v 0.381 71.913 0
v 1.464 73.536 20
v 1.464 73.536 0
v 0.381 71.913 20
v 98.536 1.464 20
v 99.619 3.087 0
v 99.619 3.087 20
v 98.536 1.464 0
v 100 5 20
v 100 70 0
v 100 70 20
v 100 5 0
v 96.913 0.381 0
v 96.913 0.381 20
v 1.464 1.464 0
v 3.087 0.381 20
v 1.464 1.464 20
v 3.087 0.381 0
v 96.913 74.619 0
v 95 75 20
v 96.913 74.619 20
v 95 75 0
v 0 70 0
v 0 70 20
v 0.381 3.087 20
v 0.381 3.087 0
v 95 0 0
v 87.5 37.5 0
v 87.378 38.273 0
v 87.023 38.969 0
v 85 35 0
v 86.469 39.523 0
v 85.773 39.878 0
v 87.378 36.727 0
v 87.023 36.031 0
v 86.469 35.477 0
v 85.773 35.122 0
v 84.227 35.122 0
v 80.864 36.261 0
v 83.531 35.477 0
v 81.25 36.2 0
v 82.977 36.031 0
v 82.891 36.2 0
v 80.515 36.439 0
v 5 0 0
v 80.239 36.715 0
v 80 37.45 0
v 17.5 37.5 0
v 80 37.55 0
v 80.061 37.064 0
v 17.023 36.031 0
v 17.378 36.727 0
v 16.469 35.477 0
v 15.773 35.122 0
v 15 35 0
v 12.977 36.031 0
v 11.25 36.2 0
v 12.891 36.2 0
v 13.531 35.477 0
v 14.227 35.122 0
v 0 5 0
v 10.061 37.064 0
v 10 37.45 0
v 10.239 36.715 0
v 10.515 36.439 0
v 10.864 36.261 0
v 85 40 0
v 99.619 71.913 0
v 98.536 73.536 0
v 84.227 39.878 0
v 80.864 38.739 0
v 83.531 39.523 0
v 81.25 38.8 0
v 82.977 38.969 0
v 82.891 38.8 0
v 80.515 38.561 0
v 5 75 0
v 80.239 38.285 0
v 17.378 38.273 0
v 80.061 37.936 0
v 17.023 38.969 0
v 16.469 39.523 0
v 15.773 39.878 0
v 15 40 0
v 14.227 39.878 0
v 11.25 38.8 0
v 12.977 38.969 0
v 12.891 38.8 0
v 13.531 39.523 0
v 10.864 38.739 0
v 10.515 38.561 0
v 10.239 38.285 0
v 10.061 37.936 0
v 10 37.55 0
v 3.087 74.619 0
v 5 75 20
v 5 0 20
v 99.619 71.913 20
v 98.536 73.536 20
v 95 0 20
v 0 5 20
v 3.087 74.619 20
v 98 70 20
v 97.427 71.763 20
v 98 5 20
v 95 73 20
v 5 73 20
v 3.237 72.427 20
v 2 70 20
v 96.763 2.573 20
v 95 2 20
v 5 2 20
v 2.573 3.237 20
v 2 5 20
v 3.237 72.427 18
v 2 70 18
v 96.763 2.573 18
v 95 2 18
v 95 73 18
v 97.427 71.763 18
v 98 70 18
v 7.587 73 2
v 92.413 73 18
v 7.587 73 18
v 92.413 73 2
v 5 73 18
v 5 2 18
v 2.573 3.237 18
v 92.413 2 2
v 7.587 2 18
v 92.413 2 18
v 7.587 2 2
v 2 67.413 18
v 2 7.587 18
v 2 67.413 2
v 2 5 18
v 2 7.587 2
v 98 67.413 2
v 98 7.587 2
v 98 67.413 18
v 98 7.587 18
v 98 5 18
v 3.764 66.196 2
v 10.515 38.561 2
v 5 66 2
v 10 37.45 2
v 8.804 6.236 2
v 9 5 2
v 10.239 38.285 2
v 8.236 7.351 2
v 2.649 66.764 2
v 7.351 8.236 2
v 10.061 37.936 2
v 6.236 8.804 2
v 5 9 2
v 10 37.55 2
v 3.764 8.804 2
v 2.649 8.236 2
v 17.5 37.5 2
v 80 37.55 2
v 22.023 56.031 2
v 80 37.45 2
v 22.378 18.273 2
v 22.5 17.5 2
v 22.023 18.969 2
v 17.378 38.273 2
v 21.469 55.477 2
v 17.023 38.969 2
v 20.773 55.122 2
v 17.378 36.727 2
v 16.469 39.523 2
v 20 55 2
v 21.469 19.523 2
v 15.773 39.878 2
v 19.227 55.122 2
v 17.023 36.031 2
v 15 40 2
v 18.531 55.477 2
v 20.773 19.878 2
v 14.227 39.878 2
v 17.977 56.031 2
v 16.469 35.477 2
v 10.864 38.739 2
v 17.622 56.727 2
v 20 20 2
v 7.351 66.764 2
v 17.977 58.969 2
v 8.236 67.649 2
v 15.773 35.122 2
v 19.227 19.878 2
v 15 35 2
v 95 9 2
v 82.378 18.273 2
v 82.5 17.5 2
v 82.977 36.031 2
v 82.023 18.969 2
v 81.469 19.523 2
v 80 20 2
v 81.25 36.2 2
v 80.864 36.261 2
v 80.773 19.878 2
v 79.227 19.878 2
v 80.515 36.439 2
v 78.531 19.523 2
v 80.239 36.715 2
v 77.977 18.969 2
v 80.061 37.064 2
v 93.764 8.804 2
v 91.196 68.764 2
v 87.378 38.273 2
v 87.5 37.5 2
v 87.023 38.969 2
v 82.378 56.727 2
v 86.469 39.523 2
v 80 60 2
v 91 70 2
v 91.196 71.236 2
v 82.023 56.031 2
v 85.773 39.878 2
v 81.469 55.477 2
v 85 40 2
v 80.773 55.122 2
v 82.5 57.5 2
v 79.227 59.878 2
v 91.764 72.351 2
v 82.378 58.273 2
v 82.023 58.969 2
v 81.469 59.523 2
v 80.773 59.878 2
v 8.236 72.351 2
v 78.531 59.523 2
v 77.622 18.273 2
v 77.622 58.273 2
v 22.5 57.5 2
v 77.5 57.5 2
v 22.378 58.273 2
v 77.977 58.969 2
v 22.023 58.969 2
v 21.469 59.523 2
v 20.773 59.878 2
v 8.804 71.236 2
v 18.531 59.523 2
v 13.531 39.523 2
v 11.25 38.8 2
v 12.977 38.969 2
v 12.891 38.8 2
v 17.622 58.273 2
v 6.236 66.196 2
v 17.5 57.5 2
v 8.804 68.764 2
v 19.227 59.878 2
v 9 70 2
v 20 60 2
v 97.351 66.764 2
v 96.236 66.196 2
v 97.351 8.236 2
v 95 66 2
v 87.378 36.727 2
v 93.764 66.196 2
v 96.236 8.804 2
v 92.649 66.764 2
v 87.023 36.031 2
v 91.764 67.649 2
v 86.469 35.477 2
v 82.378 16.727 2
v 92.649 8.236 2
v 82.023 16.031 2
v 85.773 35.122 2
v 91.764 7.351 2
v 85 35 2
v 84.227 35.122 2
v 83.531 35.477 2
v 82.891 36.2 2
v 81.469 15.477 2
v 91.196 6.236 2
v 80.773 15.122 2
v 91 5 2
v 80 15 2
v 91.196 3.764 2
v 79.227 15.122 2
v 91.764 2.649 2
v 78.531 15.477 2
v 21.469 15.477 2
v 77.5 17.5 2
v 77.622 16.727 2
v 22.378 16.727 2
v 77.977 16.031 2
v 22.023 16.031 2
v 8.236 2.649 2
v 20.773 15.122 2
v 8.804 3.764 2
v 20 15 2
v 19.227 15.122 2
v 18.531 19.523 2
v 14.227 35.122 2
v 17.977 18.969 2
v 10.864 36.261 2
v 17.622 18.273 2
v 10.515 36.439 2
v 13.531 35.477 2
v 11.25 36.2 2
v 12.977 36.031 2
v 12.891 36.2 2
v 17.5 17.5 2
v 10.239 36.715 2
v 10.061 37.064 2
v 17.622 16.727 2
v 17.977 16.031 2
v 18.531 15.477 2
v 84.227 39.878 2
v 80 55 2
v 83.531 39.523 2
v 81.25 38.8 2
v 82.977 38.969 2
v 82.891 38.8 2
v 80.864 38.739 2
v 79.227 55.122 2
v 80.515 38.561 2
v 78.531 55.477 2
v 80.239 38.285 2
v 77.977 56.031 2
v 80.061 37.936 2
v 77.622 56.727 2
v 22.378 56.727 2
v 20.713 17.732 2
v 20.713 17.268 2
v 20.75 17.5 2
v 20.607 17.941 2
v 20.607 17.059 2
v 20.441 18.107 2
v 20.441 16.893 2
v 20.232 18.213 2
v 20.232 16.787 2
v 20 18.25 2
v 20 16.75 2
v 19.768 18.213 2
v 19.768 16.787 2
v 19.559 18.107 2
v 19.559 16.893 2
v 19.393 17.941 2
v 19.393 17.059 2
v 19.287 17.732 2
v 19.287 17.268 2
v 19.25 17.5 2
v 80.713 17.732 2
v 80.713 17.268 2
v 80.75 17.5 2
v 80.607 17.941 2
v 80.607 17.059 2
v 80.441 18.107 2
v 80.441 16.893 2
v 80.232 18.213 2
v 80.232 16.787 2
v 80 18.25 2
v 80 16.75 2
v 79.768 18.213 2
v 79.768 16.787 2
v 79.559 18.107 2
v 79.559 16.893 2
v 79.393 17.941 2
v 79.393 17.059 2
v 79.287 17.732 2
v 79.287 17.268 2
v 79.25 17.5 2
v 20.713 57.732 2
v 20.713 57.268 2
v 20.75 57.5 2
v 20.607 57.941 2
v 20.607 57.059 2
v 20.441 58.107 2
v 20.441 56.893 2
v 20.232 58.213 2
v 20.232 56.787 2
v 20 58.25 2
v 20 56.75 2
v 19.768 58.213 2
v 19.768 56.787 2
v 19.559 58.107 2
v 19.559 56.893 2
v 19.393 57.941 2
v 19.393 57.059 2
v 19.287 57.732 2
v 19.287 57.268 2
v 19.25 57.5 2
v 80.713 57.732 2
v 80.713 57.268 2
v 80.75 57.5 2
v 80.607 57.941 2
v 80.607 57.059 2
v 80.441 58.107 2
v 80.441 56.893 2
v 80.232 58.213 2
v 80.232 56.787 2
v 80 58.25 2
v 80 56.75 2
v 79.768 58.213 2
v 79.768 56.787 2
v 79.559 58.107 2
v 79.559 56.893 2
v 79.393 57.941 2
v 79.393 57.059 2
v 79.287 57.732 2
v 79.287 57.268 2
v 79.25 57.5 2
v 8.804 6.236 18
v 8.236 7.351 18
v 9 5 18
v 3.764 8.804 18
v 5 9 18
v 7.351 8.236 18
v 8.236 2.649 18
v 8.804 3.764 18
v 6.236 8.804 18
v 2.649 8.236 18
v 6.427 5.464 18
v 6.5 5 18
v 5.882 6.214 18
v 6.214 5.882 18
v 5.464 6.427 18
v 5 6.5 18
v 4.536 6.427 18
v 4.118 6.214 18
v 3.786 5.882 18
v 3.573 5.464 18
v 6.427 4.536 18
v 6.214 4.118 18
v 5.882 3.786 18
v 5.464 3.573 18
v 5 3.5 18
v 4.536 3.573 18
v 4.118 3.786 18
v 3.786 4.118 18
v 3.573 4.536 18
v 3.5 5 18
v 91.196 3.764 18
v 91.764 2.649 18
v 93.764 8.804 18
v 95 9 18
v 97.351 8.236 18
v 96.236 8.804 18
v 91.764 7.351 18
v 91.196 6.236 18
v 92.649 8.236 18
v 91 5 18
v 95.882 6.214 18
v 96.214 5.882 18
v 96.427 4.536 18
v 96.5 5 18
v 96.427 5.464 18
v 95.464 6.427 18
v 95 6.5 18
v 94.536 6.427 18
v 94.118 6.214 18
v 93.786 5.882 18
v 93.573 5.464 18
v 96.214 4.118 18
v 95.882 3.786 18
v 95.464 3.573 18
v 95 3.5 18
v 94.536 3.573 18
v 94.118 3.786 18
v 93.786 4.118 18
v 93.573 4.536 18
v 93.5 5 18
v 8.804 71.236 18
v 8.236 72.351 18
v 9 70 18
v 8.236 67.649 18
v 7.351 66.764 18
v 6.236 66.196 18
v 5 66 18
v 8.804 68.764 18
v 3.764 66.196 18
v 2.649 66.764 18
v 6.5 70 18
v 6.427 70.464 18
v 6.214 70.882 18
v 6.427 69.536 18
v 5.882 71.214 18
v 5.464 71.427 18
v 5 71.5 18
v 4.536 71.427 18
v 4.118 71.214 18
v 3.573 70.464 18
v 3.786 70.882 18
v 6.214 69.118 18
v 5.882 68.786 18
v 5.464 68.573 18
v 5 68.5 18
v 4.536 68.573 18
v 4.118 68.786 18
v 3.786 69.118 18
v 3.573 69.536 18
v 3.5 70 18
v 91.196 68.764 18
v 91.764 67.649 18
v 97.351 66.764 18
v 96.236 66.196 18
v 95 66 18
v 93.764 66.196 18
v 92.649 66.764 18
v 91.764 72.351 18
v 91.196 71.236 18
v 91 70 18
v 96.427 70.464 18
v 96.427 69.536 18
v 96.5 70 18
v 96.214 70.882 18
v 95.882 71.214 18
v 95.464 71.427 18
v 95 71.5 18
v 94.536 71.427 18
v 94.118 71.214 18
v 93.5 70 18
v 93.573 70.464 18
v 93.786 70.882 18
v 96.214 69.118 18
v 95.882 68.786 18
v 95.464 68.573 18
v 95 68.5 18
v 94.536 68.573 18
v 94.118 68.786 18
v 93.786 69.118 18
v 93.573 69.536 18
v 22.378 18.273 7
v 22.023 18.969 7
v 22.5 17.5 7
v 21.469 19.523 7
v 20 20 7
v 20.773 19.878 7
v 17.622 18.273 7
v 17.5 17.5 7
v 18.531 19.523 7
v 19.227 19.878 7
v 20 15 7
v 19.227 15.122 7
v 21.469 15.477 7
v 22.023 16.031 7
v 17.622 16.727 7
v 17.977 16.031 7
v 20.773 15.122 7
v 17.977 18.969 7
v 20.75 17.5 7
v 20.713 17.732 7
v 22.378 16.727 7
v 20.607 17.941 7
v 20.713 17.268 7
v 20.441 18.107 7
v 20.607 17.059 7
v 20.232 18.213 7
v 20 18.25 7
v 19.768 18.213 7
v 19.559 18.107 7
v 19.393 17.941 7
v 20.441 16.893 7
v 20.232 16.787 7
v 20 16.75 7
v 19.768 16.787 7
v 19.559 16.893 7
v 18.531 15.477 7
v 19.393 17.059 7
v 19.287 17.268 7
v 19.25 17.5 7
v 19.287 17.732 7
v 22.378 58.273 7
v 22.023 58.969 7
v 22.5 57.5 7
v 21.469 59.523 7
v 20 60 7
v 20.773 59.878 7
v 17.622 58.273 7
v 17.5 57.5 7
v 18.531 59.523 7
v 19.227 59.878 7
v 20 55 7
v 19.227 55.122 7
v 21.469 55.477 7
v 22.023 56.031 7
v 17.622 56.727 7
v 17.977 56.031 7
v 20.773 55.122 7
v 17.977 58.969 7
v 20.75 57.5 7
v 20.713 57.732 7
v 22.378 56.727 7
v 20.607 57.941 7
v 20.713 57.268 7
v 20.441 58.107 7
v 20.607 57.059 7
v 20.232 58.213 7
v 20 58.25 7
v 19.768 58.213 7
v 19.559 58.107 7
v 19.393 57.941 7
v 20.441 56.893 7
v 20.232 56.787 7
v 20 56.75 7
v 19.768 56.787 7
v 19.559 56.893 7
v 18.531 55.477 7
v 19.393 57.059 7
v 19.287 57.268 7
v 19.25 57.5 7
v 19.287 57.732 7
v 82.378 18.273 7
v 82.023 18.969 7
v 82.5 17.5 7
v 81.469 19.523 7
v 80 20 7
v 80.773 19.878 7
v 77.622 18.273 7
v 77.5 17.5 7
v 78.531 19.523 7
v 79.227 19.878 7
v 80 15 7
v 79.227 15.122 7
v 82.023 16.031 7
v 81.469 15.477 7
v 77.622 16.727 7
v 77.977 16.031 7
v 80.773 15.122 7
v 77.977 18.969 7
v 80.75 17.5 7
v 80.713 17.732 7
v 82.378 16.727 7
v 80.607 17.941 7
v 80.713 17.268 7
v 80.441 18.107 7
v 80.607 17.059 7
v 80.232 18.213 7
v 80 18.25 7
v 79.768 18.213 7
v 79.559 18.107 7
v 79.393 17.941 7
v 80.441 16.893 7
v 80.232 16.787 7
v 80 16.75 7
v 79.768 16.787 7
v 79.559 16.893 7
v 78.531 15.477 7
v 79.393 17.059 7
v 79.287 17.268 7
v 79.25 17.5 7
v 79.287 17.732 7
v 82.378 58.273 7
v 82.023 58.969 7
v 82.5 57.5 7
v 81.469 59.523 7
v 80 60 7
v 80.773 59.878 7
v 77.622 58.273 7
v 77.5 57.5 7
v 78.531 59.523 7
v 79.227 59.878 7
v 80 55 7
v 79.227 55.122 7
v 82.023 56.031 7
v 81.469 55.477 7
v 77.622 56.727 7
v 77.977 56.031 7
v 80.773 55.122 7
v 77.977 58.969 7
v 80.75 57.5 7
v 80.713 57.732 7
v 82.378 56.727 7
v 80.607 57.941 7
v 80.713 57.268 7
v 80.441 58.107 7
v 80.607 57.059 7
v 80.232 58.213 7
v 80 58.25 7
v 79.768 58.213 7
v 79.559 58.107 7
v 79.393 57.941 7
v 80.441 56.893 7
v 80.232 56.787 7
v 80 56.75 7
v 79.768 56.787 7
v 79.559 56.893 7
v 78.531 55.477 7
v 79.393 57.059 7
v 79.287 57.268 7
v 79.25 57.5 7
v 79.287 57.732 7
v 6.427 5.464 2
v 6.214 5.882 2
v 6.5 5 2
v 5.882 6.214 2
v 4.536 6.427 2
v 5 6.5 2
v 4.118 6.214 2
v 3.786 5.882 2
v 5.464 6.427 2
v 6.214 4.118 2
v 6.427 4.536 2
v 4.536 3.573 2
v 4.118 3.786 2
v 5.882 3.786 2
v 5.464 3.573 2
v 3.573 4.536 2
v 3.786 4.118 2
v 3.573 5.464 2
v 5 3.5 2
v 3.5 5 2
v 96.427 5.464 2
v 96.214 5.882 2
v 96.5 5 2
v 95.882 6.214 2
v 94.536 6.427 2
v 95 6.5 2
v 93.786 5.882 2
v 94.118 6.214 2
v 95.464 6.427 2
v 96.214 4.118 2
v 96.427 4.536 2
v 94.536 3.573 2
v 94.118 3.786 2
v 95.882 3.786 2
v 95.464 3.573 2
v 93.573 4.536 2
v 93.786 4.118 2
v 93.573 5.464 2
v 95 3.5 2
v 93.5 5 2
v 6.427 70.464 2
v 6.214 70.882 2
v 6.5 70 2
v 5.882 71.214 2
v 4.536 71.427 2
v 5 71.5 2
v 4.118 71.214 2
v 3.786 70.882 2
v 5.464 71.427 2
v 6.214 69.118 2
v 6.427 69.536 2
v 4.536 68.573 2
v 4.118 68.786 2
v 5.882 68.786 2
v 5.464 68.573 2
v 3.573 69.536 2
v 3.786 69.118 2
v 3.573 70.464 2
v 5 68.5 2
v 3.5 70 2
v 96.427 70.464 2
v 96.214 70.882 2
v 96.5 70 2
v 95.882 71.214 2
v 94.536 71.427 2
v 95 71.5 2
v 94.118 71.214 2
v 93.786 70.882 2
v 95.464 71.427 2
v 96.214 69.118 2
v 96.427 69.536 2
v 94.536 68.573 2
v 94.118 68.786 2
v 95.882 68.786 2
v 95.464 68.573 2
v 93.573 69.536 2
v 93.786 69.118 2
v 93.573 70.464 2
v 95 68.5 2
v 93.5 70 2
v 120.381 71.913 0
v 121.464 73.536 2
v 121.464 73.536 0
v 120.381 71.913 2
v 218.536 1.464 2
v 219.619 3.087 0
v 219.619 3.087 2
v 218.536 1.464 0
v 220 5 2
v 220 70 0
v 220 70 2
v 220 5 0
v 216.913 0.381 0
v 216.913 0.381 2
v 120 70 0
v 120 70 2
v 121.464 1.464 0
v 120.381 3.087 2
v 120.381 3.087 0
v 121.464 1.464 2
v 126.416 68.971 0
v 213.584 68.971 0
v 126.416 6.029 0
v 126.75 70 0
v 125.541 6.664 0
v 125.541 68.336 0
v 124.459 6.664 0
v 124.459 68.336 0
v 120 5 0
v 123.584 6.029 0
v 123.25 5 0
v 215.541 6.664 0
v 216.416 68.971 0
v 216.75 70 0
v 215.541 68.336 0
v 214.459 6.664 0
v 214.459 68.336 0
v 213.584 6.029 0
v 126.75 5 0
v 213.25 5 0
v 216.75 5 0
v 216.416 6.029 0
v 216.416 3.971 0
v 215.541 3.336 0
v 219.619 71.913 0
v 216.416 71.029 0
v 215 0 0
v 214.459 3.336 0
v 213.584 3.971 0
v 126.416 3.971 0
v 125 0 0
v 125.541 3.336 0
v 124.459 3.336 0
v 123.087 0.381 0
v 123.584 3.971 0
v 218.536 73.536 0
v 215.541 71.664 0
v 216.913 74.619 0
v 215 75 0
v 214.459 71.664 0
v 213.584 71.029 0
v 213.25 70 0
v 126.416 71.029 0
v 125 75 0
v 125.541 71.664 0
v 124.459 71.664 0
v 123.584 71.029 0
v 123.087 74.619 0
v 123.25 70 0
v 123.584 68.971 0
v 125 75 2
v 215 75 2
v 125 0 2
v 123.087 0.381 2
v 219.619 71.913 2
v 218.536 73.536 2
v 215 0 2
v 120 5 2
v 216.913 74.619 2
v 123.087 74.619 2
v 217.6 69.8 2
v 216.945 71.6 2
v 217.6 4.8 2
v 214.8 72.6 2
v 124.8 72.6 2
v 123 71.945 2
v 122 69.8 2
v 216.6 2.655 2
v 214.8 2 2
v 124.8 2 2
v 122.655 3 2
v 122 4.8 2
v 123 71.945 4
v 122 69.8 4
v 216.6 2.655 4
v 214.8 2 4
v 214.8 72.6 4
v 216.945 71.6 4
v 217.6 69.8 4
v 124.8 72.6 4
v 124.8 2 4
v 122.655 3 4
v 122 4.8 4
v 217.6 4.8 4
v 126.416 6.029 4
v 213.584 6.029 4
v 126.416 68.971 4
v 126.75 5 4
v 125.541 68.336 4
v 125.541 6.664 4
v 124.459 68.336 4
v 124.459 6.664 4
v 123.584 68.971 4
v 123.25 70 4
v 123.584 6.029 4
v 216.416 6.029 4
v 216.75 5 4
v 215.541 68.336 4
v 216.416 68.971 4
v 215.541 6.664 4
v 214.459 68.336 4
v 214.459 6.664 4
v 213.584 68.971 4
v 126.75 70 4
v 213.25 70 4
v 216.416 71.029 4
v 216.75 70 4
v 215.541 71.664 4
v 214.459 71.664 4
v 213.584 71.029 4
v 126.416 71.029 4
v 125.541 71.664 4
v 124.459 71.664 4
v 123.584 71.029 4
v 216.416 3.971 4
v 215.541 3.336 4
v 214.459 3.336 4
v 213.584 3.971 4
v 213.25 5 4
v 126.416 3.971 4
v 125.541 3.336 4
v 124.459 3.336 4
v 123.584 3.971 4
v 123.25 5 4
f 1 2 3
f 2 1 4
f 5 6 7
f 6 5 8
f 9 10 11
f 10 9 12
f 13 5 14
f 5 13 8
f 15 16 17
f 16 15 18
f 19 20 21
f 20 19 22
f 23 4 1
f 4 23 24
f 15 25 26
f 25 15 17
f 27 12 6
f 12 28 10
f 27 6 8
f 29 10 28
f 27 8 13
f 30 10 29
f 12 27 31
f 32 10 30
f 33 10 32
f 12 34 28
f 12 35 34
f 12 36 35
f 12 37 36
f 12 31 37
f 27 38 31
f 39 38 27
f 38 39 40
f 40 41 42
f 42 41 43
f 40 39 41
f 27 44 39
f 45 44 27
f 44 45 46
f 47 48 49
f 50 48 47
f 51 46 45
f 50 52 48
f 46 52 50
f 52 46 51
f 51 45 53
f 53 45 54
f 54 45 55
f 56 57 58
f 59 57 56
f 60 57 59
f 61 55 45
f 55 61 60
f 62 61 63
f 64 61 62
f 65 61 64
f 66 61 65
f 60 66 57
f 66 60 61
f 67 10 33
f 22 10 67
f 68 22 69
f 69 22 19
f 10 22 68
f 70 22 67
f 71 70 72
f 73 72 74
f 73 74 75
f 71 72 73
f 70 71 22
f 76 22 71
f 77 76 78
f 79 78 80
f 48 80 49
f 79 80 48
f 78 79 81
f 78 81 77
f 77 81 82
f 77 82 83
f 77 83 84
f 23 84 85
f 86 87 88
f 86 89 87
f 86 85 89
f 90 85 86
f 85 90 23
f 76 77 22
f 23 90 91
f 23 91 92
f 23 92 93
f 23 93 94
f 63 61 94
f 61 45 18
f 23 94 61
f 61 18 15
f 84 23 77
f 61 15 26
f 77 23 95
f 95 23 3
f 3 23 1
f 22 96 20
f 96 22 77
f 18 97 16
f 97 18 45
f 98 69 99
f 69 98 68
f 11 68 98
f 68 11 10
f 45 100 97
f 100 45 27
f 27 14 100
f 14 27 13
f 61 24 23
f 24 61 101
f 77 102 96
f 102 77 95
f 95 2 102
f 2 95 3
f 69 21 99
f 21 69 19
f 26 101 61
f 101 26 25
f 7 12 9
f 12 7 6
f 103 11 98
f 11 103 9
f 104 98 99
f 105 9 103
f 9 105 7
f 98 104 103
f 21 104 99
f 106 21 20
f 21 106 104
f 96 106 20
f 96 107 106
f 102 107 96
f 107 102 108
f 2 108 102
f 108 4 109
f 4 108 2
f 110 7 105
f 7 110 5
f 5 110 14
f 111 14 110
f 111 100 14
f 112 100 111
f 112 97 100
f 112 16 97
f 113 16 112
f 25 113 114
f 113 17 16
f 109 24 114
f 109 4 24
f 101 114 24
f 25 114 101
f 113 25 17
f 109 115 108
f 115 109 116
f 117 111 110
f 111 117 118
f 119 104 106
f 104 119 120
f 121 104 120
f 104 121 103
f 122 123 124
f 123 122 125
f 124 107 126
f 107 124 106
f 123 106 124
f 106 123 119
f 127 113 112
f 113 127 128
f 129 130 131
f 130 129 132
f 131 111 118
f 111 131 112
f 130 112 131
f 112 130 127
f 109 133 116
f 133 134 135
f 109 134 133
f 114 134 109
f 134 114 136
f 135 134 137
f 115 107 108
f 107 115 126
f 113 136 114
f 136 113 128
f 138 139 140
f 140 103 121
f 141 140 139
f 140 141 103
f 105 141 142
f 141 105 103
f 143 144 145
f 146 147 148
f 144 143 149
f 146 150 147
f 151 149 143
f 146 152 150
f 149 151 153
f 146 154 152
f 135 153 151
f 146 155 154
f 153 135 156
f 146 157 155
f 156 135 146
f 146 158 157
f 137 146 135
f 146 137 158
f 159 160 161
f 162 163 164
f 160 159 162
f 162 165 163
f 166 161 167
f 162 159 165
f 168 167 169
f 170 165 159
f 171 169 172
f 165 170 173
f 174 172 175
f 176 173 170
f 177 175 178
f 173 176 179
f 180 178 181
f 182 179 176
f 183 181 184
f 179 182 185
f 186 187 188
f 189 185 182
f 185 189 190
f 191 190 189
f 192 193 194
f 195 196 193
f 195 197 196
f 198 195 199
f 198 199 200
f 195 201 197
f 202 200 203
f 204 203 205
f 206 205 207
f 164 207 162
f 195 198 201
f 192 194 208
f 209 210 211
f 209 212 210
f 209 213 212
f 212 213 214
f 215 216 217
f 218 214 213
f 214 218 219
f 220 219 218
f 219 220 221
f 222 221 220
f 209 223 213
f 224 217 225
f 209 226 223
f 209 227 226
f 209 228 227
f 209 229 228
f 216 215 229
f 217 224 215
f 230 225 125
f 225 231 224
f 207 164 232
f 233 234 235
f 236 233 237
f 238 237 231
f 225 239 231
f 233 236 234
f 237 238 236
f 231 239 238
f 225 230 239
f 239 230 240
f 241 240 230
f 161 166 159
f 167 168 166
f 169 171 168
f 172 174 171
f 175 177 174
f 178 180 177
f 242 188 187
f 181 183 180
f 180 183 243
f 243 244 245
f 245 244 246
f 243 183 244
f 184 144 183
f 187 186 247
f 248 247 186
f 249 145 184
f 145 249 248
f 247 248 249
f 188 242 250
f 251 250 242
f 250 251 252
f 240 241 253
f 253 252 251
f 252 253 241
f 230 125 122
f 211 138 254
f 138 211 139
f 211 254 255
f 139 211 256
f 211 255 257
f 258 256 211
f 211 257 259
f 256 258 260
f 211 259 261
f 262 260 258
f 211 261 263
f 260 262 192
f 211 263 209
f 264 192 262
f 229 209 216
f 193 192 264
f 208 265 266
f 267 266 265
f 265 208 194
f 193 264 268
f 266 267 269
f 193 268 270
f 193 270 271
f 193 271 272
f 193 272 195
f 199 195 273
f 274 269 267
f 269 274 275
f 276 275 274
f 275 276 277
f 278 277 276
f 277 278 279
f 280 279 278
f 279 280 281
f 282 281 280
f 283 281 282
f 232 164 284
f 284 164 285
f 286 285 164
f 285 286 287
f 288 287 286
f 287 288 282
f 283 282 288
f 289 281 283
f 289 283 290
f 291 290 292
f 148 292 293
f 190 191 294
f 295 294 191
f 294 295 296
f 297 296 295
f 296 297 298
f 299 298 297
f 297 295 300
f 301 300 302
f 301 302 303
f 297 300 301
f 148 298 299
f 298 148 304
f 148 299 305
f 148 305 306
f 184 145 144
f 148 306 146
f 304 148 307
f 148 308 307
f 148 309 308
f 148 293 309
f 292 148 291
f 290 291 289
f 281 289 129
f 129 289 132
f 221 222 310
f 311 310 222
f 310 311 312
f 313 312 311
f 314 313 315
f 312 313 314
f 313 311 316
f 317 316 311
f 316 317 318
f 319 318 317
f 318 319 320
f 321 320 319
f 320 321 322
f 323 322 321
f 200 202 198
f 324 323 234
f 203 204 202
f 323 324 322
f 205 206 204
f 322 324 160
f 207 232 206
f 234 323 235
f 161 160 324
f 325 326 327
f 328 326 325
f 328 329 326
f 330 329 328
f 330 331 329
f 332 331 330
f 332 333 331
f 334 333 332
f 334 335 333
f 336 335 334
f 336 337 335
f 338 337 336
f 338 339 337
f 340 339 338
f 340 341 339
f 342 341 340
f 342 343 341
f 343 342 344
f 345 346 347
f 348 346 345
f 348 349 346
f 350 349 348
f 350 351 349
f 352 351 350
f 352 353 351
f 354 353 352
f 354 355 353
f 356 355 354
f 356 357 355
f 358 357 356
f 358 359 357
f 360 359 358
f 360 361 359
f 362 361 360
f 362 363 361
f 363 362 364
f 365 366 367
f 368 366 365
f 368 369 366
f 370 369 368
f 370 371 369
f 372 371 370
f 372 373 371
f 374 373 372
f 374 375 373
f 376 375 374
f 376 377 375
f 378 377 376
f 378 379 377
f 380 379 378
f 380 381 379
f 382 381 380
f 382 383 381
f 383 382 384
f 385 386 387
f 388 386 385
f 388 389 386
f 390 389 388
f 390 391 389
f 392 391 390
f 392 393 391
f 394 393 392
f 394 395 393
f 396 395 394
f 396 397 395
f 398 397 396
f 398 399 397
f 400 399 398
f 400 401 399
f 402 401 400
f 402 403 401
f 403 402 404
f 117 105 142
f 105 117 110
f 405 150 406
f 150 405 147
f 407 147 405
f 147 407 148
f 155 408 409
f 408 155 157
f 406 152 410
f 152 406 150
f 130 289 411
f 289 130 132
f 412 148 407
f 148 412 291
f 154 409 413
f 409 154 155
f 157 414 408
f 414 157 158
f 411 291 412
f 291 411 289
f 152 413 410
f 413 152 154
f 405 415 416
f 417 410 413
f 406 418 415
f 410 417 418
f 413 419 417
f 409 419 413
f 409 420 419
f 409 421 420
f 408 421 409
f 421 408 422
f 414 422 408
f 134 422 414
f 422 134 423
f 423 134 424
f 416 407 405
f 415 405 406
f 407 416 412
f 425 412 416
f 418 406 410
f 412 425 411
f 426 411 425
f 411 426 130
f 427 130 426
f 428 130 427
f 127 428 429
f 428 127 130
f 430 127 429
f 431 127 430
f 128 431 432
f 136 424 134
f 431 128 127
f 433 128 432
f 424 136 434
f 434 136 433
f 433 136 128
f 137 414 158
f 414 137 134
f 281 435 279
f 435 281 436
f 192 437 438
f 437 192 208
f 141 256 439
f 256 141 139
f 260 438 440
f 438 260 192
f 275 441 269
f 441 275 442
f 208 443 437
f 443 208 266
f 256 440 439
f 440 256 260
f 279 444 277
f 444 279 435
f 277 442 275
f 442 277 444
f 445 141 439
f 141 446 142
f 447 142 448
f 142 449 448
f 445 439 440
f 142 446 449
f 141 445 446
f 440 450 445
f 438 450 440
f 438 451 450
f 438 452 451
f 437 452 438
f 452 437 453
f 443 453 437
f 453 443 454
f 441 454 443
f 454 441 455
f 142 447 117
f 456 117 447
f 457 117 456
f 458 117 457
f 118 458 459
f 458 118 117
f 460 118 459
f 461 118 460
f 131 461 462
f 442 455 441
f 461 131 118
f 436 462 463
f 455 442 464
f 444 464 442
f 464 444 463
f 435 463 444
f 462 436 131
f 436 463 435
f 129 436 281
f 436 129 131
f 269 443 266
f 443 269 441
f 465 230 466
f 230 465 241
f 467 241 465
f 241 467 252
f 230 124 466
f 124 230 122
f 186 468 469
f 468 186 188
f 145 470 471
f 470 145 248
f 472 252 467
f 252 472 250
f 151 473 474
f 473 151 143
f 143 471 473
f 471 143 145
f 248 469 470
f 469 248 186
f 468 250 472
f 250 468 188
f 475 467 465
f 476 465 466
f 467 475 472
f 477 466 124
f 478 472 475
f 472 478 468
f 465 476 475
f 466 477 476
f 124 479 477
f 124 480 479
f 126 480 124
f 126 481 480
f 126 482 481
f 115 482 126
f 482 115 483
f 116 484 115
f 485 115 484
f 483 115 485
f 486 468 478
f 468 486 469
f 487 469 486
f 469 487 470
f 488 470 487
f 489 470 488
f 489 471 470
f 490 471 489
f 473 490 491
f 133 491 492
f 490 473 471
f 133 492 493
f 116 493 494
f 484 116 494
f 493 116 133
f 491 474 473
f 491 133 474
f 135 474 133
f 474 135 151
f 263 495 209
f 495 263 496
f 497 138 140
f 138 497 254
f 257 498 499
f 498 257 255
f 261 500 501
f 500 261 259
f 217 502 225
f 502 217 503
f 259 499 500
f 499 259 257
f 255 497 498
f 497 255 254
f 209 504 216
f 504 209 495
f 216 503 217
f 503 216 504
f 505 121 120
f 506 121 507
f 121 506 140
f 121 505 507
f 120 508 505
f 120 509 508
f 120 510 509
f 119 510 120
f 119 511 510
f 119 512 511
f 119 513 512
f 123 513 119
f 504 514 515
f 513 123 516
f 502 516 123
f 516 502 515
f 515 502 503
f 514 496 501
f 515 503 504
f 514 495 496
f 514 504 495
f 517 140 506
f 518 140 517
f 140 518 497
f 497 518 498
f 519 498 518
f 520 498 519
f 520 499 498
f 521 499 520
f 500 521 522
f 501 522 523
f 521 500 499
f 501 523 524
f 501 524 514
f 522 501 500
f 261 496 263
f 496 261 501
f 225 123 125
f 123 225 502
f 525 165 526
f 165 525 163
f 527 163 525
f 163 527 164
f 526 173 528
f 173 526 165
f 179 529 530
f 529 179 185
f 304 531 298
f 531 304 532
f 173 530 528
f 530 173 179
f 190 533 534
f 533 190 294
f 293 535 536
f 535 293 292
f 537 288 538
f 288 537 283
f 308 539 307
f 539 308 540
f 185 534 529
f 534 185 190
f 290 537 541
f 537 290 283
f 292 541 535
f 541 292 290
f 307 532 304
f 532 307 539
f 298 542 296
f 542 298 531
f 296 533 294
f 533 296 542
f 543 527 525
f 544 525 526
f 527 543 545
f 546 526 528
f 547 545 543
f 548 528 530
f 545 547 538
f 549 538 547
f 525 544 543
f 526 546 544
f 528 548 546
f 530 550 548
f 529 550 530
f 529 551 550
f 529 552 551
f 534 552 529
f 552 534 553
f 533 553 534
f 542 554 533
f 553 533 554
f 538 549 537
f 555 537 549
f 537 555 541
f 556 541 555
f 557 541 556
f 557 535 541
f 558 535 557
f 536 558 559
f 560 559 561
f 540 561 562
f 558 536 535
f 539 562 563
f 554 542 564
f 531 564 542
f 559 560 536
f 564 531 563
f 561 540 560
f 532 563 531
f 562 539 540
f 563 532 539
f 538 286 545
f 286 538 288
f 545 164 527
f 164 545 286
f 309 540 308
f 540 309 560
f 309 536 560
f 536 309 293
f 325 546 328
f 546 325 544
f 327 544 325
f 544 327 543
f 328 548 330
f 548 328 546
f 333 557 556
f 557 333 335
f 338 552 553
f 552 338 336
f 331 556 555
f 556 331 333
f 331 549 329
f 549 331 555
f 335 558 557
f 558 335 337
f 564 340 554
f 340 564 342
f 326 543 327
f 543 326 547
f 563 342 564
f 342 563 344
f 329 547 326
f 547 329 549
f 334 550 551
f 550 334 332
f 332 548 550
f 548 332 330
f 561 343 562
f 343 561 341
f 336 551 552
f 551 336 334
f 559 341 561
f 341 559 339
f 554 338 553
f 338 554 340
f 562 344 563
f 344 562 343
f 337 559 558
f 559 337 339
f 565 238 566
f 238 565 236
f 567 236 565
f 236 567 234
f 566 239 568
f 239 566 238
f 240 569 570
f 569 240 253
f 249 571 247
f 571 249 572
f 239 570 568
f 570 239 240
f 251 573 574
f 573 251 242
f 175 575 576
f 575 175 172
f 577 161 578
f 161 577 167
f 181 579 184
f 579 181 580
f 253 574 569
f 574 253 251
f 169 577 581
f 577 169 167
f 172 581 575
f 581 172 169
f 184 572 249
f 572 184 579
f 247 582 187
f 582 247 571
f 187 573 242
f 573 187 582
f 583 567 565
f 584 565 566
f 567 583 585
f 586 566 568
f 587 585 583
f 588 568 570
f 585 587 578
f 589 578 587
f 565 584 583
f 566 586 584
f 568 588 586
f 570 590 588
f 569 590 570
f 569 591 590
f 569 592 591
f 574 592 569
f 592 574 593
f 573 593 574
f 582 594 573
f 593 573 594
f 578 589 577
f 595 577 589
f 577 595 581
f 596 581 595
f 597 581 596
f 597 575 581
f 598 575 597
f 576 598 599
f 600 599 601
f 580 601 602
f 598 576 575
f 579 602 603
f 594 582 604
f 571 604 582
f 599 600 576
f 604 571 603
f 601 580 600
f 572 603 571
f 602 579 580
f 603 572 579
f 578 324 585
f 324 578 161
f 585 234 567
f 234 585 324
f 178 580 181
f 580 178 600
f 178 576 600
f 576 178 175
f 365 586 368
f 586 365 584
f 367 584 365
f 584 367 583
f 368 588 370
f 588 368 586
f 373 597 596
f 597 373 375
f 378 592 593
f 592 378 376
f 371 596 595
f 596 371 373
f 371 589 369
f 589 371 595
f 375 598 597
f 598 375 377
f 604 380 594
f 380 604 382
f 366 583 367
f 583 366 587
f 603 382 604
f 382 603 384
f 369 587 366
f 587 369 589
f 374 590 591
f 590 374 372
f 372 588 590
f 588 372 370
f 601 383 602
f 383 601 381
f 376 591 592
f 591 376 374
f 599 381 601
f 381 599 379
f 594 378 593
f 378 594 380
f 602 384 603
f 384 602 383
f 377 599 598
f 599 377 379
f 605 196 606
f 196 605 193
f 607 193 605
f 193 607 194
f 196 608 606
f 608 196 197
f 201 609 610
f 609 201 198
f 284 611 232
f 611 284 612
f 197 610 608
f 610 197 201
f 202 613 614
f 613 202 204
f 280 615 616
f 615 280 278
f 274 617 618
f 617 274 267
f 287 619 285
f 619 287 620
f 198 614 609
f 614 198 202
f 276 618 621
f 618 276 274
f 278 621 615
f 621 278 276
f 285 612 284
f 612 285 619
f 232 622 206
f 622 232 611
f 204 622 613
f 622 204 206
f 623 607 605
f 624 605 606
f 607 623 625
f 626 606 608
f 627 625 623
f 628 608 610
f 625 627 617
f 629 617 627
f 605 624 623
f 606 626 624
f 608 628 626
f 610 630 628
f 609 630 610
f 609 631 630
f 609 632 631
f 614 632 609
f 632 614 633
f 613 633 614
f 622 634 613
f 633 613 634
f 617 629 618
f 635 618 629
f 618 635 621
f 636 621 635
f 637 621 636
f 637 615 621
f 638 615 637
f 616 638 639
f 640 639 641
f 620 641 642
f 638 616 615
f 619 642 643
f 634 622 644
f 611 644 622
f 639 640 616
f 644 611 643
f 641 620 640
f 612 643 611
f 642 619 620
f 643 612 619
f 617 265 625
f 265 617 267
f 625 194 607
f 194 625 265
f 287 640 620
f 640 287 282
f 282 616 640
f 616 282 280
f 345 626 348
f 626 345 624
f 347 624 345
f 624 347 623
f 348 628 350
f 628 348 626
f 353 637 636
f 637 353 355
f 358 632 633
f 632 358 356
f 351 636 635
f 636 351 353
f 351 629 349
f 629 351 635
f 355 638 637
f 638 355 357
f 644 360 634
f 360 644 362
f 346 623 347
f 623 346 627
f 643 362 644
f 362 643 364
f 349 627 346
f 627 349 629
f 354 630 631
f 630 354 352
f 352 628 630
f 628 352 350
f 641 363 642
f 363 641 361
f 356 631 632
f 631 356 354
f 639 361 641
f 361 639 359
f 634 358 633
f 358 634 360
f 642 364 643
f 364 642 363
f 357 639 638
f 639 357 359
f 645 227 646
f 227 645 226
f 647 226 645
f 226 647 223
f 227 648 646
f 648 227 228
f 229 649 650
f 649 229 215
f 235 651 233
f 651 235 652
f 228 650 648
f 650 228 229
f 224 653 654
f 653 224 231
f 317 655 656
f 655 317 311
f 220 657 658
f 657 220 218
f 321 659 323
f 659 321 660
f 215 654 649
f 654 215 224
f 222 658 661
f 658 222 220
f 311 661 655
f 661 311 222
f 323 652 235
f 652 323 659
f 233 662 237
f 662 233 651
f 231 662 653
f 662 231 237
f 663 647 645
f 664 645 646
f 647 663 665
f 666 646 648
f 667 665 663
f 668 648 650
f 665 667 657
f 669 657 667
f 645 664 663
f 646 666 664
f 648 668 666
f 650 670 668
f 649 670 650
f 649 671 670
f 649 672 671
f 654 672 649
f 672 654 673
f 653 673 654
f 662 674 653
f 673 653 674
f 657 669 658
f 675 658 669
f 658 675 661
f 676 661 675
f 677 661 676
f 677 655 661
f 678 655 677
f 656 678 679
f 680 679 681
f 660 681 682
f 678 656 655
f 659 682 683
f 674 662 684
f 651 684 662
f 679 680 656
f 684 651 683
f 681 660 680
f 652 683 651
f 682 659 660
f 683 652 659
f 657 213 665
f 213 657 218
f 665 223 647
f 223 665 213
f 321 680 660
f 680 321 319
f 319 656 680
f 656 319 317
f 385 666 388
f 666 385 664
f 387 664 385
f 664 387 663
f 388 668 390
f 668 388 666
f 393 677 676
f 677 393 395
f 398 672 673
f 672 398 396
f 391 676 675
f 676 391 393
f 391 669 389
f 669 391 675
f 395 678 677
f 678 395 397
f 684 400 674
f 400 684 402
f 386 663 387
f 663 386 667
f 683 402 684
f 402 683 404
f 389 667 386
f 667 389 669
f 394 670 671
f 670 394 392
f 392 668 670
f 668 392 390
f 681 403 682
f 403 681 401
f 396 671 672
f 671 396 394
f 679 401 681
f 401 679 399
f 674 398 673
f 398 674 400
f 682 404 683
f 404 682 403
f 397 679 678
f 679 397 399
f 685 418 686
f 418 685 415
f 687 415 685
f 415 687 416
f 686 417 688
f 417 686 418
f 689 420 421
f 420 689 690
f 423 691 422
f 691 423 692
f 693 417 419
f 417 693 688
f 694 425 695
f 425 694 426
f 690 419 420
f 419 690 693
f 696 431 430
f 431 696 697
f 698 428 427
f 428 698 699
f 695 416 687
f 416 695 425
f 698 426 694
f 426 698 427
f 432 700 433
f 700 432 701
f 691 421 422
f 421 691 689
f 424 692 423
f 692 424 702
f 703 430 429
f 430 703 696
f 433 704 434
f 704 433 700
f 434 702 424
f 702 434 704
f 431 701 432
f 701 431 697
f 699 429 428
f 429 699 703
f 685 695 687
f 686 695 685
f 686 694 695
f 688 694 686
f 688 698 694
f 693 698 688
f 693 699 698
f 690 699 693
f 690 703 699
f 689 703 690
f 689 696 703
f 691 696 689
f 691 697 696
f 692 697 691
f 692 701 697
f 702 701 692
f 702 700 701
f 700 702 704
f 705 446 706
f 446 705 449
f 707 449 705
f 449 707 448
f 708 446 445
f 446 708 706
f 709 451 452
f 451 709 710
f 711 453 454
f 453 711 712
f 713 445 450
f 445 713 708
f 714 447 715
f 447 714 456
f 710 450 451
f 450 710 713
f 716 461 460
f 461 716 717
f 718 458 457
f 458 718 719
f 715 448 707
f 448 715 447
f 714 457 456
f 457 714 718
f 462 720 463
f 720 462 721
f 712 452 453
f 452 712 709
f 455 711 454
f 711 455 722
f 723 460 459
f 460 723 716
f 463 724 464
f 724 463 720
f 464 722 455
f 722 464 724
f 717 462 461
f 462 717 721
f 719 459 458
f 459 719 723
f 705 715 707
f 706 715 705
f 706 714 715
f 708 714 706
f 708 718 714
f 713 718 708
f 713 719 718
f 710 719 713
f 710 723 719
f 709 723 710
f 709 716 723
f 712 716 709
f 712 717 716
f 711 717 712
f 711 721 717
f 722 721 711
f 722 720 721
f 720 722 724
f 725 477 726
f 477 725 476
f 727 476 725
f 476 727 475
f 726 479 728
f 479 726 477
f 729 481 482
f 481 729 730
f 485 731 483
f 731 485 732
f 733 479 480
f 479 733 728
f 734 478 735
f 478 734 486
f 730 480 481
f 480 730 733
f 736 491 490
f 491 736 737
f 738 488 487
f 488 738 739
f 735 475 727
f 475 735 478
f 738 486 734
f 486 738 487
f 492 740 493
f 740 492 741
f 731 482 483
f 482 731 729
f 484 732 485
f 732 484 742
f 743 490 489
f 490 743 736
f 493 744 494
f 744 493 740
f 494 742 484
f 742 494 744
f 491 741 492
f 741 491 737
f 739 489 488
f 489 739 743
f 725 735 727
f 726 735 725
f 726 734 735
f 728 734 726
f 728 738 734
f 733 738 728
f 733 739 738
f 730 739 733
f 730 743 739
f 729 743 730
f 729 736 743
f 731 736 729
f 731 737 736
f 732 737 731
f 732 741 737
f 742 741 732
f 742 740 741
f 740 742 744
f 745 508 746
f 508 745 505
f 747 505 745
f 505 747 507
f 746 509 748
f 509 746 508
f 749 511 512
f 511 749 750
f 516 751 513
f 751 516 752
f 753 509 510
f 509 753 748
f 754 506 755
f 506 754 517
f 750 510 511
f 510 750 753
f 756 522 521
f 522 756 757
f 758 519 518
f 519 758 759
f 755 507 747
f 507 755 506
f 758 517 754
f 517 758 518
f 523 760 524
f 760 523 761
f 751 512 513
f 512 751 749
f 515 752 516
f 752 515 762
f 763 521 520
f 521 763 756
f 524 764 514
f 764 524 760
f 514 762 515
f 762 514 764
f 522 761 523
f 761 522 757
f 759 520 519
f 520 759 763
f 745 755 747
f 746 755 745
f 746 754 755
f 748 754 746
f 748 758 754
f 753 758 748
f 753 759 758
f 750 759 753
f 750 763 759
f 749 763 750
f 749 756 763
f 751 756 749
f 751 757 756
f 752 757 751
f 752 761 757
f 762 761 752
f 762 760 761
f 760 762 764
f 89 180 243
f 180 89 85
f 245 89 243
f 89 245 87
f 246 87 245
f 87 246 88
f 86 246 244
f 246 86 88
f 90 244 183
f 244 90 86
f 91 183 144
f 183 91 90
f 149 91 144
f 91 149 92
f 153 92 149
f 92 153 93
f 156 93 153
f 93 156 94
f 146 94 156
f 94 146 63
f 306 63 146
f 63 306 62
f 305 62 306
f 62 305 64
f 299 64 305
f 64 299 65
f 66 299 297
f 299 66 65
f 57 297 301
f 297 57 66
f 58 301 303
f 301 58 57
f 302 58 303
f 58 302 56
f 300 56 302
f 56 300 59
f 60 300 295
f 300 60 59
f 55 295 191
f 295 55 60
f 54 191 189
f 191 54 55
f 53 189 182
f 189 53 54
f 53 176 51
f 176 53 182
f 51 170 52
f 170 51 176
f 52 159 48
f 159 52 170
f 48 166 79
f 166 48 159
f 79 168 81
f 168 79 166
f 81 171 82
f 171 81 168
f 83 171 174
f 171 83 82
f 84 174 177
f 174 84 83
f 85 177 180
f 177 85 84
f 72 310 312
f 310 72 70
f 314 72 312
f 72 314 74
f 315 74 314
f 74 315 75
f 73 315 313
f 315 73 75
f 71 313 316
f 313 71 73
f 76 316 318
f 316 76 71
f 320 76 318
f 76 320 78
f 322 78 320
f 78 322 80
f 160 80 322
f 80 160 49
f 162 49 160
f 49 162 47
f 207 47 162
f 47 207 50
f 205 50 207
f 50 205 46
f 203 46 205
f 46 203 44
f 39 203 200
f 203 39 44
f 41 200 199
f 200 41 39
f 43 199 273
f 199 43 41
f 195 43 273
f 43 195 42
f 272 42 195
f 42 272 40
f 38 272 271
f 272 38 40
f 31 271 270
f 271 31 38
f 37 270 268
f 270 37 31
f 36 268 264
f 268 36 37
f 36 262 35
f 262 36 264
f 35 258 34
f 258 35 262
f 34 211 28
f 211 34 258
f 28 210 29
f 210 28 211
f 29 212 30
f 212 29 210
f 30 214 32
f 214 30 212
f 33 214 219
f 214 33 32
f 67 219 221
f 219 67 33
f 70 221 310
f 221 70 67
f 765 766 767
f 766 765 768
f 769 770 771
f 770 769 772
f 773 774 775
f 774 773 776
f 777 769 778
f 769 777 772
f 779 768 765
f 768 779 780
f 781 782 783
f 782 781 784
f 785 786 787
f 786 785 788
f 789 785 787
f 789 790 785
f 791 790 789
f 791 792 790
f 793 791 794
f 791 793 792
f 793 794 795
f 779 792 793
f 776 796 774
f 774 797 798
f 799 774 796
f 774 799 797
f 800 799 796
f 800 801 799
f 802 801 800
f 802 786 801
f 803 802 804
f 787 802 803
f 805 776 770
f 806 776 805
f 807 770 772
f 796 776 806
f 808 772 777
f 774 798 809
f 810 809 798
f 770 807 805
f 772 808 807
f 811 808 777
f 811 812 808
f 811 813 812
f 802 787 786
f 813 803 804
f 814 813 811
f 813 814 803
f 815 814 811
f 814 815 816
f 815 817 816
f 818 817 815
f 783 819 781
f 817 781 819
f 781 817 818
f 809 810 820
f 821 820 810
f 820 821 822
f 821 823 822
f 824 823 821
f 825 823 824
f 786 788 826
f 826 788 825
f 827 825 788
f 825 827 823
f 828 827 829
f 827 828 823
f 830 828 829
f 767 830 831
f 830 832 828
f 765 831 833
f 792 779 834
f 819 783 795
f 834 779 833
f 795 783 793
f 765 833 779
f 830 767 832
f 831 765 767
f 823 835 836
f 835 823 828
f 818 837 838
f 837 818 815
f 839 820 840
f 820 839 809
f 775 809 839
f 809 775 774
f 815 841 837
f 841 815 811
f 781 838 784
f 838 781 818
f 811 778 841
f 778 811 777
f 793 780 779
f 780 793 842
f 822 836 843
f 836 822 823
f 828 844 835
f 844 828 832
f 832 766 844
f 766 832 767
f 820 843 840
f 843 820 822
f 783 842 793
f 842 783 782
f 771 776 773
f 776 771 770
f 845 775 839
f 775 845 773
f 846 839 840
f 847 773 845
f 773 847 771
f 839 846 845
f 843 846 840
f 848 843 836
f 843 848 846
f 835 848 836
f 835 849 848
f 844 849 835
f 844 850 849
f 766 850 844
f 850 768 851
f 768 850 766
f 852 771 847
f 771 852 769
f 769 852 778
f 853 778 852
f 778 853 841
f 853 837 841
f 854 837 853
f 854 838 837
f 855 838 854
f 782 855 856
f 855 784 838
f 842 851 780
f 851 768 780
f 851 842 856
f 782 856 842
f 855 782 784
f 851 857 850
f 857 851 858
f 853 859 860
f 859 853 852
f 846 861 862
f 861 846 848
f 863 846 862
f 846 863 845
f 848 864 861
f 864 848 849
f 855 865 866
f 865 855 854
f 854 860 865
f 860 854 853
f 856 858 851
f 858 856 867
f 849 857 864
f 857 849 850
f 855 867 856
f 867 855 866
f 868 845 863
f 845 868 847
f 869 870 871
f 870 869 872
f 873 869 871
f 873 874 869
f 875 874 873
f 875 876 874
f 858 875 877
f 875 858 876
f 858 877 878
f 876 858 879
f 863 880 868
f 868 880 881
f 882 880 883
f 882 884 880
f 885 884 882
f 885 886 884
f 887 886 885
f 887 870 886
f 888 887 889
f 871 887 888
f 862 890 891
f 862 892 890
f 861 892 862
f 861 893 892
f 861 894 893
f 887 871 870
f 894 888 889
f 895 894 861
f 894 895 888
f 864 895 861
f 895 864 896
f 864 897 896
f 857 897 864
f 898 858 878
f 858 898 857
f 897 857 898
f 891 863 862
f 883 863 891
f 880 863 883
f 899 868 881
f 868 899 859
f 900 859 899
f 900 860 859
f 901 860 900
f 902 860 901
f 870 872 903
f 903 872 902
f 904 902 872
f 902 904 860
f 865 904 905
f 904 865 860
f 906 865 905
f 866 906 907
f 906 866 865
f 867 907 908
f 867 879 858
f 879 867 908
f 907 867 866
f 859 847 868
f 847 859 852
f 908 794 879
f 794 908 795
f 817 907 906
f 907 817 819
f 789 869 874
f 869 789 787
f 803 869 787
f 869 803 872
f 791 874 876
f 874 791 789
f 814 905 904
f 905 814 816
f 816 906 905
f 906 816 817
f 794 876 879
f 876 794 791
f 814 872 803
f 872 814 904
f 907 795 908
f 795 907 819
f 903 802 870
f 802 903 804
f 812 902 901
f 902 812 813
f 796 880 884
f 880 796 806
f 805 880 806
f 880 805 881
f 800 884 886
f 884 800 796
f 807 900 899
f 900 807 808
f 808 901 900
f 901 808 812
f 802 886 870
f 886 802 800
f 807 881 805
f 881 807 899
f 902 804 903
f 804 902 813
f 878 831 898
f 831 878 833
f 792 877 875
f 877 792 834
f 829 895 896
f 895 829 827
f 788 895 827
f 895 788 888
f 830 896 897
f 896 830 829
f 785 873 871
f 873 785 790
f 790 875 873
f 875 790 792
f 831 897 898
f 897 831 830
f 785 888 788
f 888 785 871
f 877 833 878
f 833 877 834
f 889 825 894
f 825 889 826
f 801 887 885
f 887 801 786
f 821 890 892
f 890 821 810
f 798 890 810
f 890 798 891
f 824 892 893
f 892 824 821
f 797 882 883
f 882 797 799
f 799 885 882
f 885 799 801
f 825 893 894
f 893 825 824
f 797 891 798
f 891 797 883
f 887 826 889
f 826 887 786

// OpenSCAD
// Box Parameters
box_length = 100;
box_width = 75;
box_height = 20;
wall_thickness = 2;
corner_radius = 5;
lid_clearance = 0.2;
lid_height = 2;

// Screw pillar parameters
screw_hole_diameter = 3;
pillar_diameter = 8;
pillar_height = box_height - wall_thickness;

// Mounting hole parameters
mounting_holes = true;
mounting_hole_offset = 0.15;
mounting_top_diameter = 5;
mounting_screw_diameter = 2.5;

// PCB mount parameters
pcb_pillars = true;
pcb_width = 40;     // Between mounting holes
pcb_length = 60;    // Between mounting holes
pcb_pillar_height = 5;
pcb_pillar_diameter = 5;
pcb_hole_diameter = 1.5;

// Cutouts
front_cutout = false;
front_cutout_size = [5,5];
front_cutout_offset = [0,0];
front_cutout_radius = 2.5;

back_cutout = false;
back_cutout_size = [5,5];
back_cutout_offset = [0,0];
back_cutout_radius = 2.5;

left_cutout = false;
left_cutout_size = [5,5];
left_cutout_offset = [0,0];
left_cutout_radius = 2.5;

right_cutout = false;
right_cutout_size = [5,5];
right_cutout_offset = [0,0];
right_cutout_radius = 2.5;

ventilation_holes = false;
num_ventilation_holes = 5;

// Main box with flat top and bottom and screw pillars
module rounded_box(length, width, height, radius, thickness) {
    difference() {
        union() {
            difference() {
                // Outer shape with rounded sides but flat top/bottom
                linear_extrude(height)
                offset(r = radius) offset(delta = -radius)
                square([length, width], center = false);
         
                // Inner cutout
                translate([thickness, thickness, thickness])
                linear_extrude(height - thickness + 0.1)
                offset(r = max(radius - thickness, 0)) 
                offset(delta = -(max(radius - thickness, 0)))
                square([length - thickness*2, width - thickness*2], center = false);
                
                
            }
            // Add four screw pillars
            for (pos = [
                [radius, radius, 0],
                [length - radius, radius, 0],
                [radius, width - radius, 0],
                [length - radius, width - radius, 0]
            ]) {
                translate(pos)
                cylinder(h = pillar_height, d = pillar_diameter, $fn = 20);
            }
            // PCB Pillars
            if (pcb_pillars) {
                pcb_pillars();  
            }
        }
        // Screw holes through pillars
        for (pos = [
            [radius, radius, wall_thickness],
            [length - radius, radius, wall_thickness],
            [radius, width - radius, wall_thickness],
            [length - radius, width - radius, wall_thickness]
        ]) {
            translate(pos)
            cylinder(h = pillar_height + 0.1, d = screw_hole_diameter, $fn = 20);
        }

        // Mounting holes
        if (mounting_holes) {
            mounting_hole(box_length * mounting_hole_offset, box_width/2);
            mounting_hole(box_length * (1 - mounting_hole_offset), box_width/2);
        }
        
        // Cutout
        if (front_cutout) {
                side_cutout("front", 
                    size = front_cutout_size, 
                    offset = front_cutout_offset,
                    radius = front_cutout_radius);
        } 
        if (back_cutout) {
                side_cutout("back", 
                    size = back_cutout_size, 
                    offset = back_cutout_offset,
                    radius = back_cutout_radius);
        } 
        if (left_cutout) {
                side_cutout("left", 
                    size = left_cutout_size, 
                    offset = left_cutout_offset,
                    radius = left_cutout_radius);
        } 
        if (right_cutout) {
                side_cutout("right", 
                    size = right_cutout_size, 
                    offset = right_cutout_offset,
                    radius = right_cutout_radius);
        } 
    }
}

module side_cutout(
    side,               // "front", "back", "left", "right"
    size = [5,5],       // width, height
    offset = [0,0],     // left/right, up/down
    radius = 0
) {
    width = size[0];
    height = size[1];
    
    // Make sure radius is less than width/height
    radius = (radius < min(width/2,height/2)) ? radius : min(width/2,height/2) - 0.01;
    
    lr = offset[0];
    ud = offset[1];
    
    if (side == "front") {
        translate([0 - 0.01, box_width/2 - width / 2 + lr, box_height/2 - height/2 + ud])
            rotate([90,0,90])
            linear_extrude(height = wall_thickness + 0.02, $fn = 20)
                offset (r = radius) offset(delta = -radius)
                square([width,height]);
    } else if (side == "back") {
         translate([box_length - wall_thickness - 0.01, box_width/2 - width/2 + lr, box_height/2 - height/2 + ud])
            rotate([90,0,90])
            linear_extrude(height = wall_thickness + 0.02, $fn = 20)
                offset (r = radius) offset(delta = -radius)
                square([width,height]);   
    } else if (side == "left") {
         translate([box_length/2 - width/2 + lr, wall_thickness + 0.01, box_height/2 - height/2 + ud])
            rotate([90,0,0])
            linear_extrude(height = wall_thickness + 0.02, $fn = 20)
                offset (r = radius) offset(delta = -radius)
                square([width,height]);   
    } else if (side == "right") {
         translate([box_length/2 - width/2 + lr, box_width + 0.01, box_height/2 - height/2 + ud])
            rotate([90,0,0])
            linear_extrude(height = wall_thickness + 0.02, $fn = 20)
                offset (r = radius) offset(delta = -radius)
                square([width,height]);   
    }
}


module pcb_pillars() {
    y0 = (box_width - pcb_width) / 2;
    y1 = y0 + pcb_width;
    x0 = (box_length - pcb_length) / 2;
    x1 = x0 + pcb_length;
    
    for (pos = [[x0,y0,0],[x0,y1,0],[x1,y0,0],[x1,y1,0]]) {
        translate(pos) 
        difference() {
            cylinder(h = pcb_pillar_height + wall_thickness, d = pcb_pillar_diameter, $fn = 20);
            translate([0,0,wall_thickness])
                cylinder(h = pcb_pillar_height + 0.01, d = pcb_hole_diameter, $fn = 20);
        }
    }
}

module mounting_hole(x,y) {
        // We add a very small +/- z delta to make preview render clearer
        translate([x,y,-0.01])
            linear_extrude(wall_thickness + 0.02)
                rotate([0,0,180])
                union() {
                    circle(d = mounting_top_diameter, $fn=20);
                    translate([mounting_top_diameter/2,0,0])
                        offset(r = mounting_screw_diameter/2, $fn = 20) 
                            square([mounting_screw_diameter,0.1], center= true);
                }
}

// Lid with flat bottom and screw holes
module rounded_lid(length, width, height, radius, thickness) {
    difference() {
        union() {
            // Main lid plate with flat bottom
            linear_extrude(height)
            offset(r = radius) offset(delta = -radius)
            square([length, width], center = false);
            
            // Lip that fits inside the box
            translate([thickness, thickness, height])
            linear_extrude(height)
            offset(r = max(radius - thickness - lid_clearance, 0))
            offset(delta = -(max(radius - thickness - lid_clearance, 0)))
            square([
                length - thickness*2 - lid_clearance*2, 
                width - thickness*2 - lid_clearance*2
            ], center = false);
        }
        
        // Screw holes in lid
        for (pos = [
            [radius, radius, 0],
            [length - radius, radius, 0],
            [radius, width - radius, 0],
            [length - radius, width - radius, 0]
        ]) {
            translate(pos)
            cylinder(h = height*2, d = screw_hole_diameter + 0.5, $fn = 10); // Slightly larger for clearance
        }
        
        // Ventilation holes
        if (ventilation_holes) {
            for (i = [0:num_ventilation_holes-1] ) {
                translate([length * (0.1 + i/20), width * 0.1, -0.01])
                    linear_extrude(height * 2 + 0.02)
                        offset(r = thickness/2, $fn = 10) offset(delta = -thickness/2)
                        square([height + 0.01, width * 0.375]);
                translate([length * (0.1 + i/20), width * 0.525, -0.01])
                    linear_extrude(height * 2 + 0.02)
                        offset(r = thickness/2, $fn = 10) offset(delta = -thickness/2)
                        square([height + 0.01, width * 0.375]);
            }    
        }
    }
}

// Create the box
rounded_box(box_length, box_width, box_height, corner_radius, wall_thickness);

// Create the lid (positioned next to the box for printing)
translate([box_length + 20, 0, 0])
    rounded_lid(box_length, box_width, lid_height, corner_radius, wall_thickness);
